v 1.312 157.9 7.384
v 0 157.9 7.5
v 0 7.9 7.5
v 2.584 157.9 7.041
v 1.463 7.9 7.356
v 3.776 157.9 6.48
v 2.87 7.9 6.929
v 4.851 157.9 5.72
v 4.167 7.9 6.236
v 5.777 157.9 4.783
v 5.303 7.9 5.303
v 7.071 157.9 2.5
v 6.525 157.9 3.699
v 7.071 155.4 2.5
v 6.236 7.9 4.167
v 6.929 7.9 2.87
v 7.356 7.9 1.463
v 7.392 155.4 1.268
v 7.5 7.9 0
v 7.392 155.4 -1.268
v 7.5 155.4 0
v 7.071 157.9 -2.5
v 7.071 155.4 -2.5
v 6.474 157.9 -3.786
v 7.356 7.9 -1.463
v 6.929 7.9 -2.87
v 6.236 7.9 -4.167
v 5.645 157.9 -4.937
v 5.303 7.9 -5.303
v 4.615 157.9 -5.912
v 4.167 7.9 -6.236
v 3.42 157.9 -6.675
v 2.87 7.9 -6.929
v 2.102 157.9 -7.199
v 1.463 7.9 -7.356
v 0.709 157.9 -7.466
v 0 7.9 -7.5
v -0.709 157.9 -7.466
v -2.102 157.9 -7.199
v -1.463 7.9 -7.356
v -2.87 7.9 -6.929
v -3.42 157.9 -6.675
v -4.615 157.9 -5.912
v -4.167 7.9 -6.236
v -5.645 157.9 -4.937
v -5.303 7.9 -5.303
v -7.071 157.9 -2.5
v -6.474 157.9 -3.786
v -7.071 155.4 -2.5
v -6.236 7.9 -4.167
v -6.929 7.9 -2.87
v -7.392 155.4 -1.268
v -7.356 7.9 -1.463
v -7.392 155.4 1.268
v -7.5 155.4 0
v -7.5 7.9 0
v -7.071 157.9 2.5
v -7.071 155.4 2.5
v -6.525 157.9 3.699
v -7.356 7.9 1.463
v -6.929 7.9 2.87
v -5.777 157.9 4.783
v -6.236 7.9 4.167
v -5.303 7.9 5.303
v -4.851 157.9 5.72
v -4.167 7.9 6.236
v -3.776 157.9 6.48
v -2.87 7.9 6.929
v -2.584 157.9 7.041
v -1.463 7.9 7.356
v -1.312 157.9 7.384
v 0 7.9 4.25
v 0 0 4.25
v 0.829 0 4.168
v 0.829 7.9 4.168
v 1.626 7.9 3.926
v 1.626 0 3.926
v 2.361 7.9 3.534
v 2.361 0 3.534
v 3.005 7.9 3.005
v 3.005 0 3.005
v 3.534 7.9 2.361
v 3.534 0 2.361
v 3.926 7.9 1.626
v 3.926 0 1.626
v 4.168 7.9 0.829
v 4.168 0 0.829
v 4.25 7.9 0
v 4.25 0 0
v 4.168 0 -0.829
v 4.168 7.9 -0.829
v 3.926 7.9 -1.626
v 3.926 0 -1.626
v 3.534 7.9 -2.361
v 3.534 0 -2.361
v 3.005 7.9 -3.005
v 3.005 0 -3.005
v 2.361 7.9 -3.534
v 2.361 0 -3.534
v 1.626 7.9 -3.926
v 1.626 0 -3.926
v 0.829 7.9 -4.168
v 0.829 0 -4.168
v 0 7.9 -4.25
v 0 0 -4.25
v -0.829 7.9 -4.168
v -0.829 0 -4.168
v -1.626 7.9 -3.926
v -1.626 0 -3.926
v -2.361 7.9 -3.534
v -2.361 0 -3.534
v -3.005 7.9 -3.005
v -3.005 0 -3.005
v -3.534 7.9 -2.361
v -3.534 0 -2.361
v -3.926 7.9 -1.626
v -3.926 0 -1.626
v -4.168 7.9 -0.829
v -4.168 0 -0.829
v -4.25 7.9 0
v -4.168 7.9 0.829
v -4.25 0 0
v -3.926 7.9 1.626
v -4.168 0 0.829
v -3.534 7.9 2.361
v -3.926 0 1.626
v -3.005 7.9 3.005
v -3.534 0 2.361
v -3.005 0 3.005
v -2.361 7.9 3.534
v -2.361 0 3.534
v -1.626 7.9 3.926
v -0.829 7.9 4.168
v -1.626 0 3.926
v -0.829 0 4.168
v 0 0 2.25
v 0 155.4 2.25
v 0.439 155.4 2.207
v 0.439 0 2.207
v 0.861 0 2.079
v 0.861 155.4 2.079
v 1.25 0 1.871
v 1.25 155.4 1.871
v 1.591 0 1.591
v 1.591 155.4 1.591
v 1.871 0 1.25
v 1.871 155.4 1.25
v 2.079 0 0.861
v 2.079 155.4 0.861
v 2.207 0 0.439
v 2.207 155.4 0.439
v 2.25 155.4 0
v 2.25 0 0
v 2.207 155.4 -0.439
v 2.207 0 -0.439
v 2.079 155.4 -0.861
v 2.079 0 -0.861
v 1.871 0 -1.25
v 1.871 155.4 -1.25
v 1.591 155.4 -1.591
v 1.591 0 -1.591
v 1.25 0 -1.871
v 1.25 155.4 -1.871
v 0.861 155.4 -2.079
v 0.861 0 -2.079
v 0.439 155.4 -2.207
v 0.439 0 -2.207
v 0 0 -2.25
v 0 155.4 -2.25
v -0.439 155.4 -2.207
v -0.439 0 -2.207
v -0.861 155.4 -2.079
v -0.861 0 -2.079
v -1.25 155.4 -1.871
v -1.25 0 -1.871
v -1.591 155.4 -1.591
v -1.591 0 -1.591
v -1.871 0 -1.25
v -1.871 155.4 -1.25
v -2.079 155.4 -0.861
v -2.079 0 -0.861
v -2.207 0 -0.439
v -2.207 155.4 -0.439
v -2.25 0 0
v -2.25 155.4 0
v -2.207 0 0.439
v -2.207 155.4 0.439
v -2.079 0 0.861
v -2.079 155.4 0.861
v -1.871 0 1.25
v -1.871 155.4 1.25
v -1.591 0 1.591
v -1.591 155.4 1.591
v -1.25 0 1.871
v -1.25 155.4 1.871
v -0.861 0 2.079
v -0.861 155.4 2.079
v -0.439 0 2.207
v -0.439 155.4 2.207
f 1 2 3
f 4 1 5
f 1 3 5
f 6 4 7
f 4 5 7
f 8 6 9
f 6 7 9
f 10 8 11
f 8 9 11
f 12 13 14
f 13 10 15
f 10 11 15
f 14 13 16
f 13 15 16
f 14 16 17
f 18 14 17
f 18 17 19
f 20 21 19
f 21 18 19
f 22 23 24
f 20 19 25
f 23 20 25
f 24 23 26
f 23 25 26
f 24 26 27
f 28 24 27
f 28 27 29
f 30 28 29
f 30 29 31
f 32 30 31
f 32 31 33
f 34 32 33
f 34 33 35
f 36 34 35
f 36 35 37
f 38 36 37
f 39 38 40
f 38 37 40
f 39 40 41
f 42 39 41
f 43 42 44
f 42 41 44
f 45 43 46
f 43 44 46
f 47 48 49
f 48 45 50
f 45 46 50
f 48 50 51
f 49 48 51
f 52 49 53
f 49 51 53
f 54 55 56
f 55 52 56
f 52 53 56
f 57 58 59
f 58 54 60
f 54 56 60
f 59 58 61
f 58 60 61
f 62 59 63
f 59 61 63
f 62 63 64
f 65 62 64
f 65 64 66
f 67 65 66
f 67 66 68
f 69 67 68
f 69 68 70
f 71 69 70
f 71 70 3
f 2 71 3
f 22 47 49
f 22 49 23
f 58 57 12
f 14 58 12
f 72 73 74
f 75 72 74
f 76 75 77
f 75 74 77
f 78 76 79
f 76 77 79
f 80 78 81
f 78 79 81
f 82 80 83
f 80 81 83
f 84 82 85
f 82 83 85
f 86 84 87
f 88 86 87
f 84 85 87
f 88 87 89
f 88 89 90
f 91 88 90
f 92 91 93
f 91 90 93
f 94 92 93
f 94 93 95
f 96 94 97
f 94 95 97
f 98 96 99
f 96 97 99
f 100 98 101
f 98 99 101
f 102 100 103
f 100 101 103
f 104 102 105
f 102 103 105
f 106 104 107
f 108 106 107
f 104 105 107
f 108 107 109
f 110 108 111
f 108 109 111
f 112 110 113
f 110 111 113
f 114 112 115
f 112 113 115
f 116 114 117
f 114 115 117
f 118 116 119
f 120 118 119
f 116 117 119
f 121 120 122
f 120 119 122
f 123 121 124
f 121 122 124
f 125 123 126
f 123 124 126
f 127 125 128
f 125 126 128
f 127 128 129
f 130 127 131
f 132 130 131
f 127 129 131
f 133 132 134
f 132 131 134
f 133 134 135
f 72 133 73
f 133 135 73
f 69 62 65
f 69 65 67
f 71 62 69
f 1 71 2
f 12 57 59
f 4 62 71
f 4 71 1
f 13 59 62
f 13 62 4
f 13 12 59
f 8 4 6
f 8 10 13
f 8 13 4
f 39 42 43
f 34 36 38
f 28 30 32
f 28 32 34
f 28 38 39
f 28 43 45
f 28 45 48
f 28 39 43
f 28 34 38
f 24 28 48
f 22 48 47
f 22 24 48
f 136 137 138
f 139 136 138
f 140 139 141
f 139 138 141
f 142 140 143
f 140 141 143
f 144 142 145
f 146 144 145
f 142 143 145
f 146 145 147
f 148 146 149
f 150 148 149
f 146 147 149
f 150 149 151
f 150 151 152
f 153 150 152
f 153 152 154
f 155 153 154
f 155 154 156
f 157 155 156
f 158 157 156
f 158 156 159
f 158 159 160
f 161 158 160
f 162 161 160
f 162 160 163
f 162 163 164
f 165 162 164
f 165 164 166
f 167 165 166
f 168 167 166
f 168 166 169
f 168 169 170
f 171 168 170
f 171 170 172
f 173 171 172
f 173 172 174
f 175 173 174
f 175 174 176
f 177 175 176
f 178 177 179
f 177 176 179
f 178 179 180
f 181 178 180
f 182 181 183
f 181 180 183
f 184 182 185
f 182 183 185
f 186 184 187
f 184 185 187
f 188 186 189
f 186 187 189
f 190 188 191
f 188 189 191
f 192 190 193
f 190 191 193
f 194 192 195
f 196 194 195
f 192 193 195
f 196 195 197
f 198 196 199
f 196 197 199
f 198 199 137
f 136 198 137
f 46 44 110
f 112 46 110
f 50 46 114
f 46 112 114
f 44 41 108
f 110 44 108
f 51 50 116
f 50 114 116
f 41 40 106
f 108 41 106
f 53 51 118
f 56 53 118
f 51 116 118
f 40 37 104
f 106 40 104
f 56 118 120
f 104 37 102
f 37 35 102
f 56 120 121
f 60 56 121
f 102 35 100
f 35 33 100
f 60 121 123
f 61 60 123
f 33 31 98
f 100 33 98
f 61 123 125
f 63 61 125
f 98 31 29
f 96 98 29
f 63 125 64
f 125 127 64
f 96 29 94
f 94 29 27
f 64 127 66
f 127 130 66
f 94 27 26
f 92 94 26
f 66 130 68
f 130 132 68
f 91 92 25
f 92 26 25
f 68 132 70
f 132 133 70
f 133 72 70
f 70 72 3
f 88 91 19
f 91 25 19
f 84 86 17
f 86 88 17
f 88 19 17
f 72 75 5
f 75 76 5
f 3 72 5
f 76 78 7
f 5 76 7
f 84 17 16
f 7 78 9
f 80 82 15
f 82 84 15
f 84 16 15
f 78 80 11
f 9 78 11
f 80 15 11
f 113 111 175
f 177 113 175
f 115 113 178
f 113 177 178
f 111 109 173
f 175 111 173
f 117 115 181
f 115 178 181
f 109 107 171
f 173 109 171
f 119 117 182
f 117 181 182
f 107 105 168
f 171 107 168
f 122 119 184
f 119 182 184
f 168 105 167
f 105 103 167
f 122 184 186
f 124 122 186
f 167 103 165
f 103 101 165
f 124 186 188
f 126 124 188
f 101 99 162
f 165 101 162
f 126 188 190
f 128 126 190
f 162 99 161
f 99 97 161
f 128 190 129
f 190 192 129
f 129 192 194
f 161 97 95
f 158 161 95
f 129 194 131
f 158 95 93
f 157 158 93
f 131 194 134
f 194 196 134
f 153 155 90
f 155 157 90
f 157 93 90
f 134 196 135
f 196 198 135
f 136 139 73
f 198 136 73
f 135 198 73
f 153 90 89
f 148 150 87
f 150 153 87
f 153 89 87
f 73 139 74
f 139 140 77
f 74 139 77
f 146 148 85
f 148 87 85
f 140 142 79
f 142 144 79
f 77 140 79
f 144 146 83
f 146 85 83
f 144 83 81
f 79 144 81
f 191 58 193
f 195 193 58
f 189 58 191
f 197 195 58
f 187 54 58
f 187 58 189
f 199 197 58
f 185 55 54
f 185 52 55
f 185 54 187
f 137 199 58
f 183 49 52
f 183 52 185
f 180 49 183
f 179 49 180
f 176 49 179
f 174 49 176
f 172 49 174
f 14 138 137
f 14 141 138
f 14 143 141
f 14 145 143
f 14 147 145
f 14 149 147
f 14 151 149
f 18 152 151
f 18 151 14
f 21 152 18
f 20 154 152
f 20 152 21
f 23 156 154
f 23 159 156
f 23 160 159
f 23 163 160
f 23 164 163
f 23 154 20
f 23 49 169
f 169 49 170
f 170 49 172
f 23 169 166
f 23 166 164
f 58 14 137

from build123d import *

# Parameters (mm, degrees)
SKETCH1_R           = 4.25
BOSS_EXTRUDE1_DEPTH = 7.9
SKETCH2_R           = 7.5
BOSS_EXTRUDE2_DEPTH = 150
SKETCH3_R           = 2.25
CUT_EXTRUDE1_DEPTH  = 159.255837175
SKETCH4_W           = 15
SKETCH4_H           = 5
CUT_EXTRUDE2_DEPTH  = 2.5


with BuildPart() as part:
    # Sketch1 → Boss-Extrude1 (new body)
    with BuildSketch(Plane(origin=(0, 0, 0), x_dir=(1, 0, 0), z_dir=(0, 1, 0))):
        with Locations(Location((0, 0, 0), (0, 0, 270))):
            Circle(SKETCH1_R)
    extrude(amount=BOSS_EXTRUDE1_DEPTH)

    # Sketch2 → Boss-Extrude2 (add)
    with BuildSketch(Plane(origin=(0, 7.9, 0), x_dir=(1, 0, 0), z_dir=(0, 1, 0))):
        with Locations(Location((0, 0, 0), (0, 0, 270))):
            Circle(SKETCH2_R)
    extrude(amount=BOSS_EXTRUDE2_DEPTH)

    # Sketch3 → Cut-Extrude1 (cut, through all)
    with BuildSketch(Plane(origin=(0, 157.9, 0), x_dir=(1, 0, 0), z_dir=(0, 1, 0))):
        with Locations(Location((0, 0, 0), (0, 0, 270))):
            Circle(SKETCH3_R)
    extrude(amount=-CUT_EXTRUDE1_DEPTH, mode=Mode.SUBTRACT)

    # Sketch4 → Cut-Extrude2 (cut)
    with BuildSketch(Plane(origin=(0, 157.9, 0), x_dir=(1, 0, 0), z_dir=(0, 1, 0))):
        Rectangle(SKETCH4_W, SKETCH4_H)
    extrude(amount=-CUT_EXTRUDE2_DEPTH, mode=Mode.SUBTRACT)


solid = part.part
